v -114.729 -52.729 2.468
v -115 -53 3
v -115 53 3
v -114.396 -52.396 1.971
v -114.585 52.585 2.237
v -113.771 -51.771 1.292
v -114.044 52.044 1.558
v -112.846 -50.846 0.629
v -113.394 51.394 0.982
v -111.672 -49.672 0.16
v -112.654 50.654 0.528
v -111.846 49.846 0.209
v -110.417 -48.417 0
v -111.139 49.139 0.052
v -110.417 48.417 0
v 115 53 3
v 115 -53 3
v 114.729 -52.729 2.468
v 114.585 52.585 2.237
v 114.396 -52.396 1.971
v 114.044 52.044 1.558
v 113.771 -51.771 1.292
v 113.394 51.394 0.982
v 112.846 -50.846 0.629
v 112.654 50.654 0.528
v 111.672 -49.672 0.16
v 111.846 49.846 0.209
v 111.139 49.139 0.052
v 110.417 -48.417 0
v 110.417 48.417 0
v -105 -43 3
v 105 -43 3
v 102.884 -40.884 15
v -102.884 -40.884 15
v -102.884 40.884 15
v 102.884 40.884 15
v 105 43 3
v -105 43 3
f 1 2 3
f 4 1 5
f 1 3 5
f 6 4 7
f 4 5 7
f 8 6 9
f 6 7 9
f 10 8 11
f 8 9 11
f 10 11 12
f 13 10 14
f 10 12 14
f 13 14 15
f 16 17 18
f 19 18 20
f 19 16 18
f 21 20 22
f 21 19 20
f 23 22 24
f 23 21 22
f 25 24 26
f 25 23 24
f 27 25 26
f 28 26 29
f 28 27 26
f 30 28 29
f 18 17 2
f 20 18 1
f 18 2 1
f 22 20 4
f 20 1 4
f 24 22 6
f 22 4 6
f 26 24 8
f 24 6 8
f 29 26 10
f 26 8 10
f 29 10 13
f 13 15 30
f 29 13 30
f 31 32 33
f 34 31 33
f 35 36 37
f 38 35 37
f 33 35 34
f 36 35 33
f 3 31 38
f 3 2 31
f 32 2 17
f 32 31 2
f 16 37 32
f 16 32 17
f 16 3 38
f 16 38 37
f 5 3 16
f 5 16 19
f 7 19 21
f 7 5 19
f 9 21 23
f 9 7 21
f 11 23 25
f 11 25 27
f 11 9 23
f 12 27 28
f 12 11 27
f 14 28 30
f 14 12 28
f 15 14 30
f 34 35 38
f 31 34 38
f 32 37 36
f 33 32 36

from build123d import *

# Parameters (mm, degrees)
F0_W         = 210
F0_H         = 86
F1_DEPTH     = 15
F0_W_2       = 230
F0_H_2       = 106
F2_DEPTH     = 3
F3_T1_DEPTH  = 252.9128784748
F3_T3_DEPTH  = 128.9128784748
F4_T4_DEPTH  = 272.3649311141
F4_T9_DEPTH  = 148.3649311141
F4_T14_DEPTH = 272.3649311141
F4_T19_DEPTH = 148.3649311141


# Not quite as in the source:
# - a fillet or chamfer that OpenCascade refuses, or shapes differently, is made with other operations: its cross-section is extruded or revolved along the edge and cut away or added


with BuildPart() as f1:
    # F0 (on Top) → F1 (new body)
    with BuildSketch(Plane.XY):
        Rectangle(F0_W, F0_H)
    extrude(amount=F1_DEPTH)

    # F0 (on Top) → F2 (join)
    with BuildSketch(Plane.XY):
        Rectangle(F0_W_2, F0_H_2)
        Rectangle(F0_W, F0_H, mode=Mode.SUBTRACT)
    extrude(amount=F2_DEPTH)

    # F3: fillet of radius 5 on 4 edges, made by hand

    # F3_s2 → F3_t1 (cut)
    with BuildSketch(Plane.YZ.offset(-126.4564392374)):
        with BuildLine():
            ThreePointArc((-53, 3), (-51.1560370926, 0.8166998673), (-48.417424305, 0))
            Line((-48.417424305, 0), (-53, 0))
            Line((-53, 0), (-53, 3))
        make_face()
        with BuildLine():
            ThreePointArc((53, 3), (51.1560370926, 0.8166998673), (48.417424305, 0))
            Line((48.417424305, 0), (53, 0))
            Line((53, 0), (53, 3))
        make_face()
    extrude(amount=F3_T1_DEPTH, mode=Mode.SUBTRACT)

    # F3_s4 → F3_t3 (cut)
    with BuildSketch(Plane.XZ.offset(-64.4564392374)):
        with BuildLine():
            ThreePointArc((115, 3), (113.1560370926, 0.8166998673), (110.417424305, 0))
            Line((110.417424305, 0), (115, 0))
            Line((115, 0), (115, 3))
        make_face()
        with BuildLine():
            ThreePointArc((-115, 3), (-113.1560370926, 0.8166998673), (-110.417424305, 0))
            Line((-110.417424305, 0), (-115, 0))
            Line((-115, 0), (-115, 3))
        make_face()
    extrude(amount=F3_T3_DEPTH, mode=Mode.SUBTRACT)

    # F4: chamfer of 12 x 2.1159237685 on 4 edges, made by hand


with BuildPart() as f4_tool2:
    # F4_s3 → F4_t4 (new body)
    with BuildSketch(Plane.YZ.offset(-136.1824655571)):
        Polygon((-43, 3), (-40.8840762315, 15), (-43, 15), align=None)
    extrude(amount=F4_T4_DEPTH)

    split(bisect_by=Plane.XY.offset(3), keep=Keep.TOP)


with BuildPart() as f1_1:
    add(f1.part)

    # F4_t1: cut F4_tool2
    add(f4_tool2.part, mode=Mode.SUBTRACT)


with BuildPart() as f4_tool7:
    # F4_s8 → F4_t9 (new body)
    with BuildSketch(Plane.XZ.offset(74.1824655571)):
        Polygon((105, 3), (102.8840762315, 15), (105, 15), align=None)
    extrude(amount=-F4_T9_DEPTH)

    split(bisect_by=Plane.XY.offset(3), keep=Keep.TOP)


with BuildPart() as f1_2:
    add(f1_1.part)

    # F4_t6: cut F4_tool7
    add(f4_tool7.part, mode=Mode.SUBTRACT)


with BuildPart() as f4_tool12:
    # F4_s13 → F4_t14 (new body)
    with BuildSketch(Plane.YZ.offset(136.1824655571)):
        Polygon((40.8840762315, 15), (43, 3), (43, 15), align=None)
    extrude(amount=-F4_T14_DEPTH)

    split(bisect_by=Plane.XY.offset(3), keep=Keep.TOP)


with BuildPart() as f1_3:
    add(f1_2.part)

    # F4_t11: cut F4_tool12
    add(f4_tool12.part, mode=Mode.SUBTRACT)


with BuildPart() as f4_tool17:
    # F4_s18 → F4_t19 (new body)
    with BuildSketch(Plane.XZ.offset(-74.1824655571)):
        Polygon((-102.8840762315, 15), (-105, 3), (-105, 15), align=None)
    extrude(amount=F4_T19_DEPTH)

    split(bisect_by=Plane.XY.offset(3), keep=Keep.TOP)


with BuildPart() as f1_4:
    add(f1_3.part)

    # F4_t16: cut F4_tool17
    add(f4_tool17.part, mode=Mode.SUBTRACT)


solid = f1_4.part
